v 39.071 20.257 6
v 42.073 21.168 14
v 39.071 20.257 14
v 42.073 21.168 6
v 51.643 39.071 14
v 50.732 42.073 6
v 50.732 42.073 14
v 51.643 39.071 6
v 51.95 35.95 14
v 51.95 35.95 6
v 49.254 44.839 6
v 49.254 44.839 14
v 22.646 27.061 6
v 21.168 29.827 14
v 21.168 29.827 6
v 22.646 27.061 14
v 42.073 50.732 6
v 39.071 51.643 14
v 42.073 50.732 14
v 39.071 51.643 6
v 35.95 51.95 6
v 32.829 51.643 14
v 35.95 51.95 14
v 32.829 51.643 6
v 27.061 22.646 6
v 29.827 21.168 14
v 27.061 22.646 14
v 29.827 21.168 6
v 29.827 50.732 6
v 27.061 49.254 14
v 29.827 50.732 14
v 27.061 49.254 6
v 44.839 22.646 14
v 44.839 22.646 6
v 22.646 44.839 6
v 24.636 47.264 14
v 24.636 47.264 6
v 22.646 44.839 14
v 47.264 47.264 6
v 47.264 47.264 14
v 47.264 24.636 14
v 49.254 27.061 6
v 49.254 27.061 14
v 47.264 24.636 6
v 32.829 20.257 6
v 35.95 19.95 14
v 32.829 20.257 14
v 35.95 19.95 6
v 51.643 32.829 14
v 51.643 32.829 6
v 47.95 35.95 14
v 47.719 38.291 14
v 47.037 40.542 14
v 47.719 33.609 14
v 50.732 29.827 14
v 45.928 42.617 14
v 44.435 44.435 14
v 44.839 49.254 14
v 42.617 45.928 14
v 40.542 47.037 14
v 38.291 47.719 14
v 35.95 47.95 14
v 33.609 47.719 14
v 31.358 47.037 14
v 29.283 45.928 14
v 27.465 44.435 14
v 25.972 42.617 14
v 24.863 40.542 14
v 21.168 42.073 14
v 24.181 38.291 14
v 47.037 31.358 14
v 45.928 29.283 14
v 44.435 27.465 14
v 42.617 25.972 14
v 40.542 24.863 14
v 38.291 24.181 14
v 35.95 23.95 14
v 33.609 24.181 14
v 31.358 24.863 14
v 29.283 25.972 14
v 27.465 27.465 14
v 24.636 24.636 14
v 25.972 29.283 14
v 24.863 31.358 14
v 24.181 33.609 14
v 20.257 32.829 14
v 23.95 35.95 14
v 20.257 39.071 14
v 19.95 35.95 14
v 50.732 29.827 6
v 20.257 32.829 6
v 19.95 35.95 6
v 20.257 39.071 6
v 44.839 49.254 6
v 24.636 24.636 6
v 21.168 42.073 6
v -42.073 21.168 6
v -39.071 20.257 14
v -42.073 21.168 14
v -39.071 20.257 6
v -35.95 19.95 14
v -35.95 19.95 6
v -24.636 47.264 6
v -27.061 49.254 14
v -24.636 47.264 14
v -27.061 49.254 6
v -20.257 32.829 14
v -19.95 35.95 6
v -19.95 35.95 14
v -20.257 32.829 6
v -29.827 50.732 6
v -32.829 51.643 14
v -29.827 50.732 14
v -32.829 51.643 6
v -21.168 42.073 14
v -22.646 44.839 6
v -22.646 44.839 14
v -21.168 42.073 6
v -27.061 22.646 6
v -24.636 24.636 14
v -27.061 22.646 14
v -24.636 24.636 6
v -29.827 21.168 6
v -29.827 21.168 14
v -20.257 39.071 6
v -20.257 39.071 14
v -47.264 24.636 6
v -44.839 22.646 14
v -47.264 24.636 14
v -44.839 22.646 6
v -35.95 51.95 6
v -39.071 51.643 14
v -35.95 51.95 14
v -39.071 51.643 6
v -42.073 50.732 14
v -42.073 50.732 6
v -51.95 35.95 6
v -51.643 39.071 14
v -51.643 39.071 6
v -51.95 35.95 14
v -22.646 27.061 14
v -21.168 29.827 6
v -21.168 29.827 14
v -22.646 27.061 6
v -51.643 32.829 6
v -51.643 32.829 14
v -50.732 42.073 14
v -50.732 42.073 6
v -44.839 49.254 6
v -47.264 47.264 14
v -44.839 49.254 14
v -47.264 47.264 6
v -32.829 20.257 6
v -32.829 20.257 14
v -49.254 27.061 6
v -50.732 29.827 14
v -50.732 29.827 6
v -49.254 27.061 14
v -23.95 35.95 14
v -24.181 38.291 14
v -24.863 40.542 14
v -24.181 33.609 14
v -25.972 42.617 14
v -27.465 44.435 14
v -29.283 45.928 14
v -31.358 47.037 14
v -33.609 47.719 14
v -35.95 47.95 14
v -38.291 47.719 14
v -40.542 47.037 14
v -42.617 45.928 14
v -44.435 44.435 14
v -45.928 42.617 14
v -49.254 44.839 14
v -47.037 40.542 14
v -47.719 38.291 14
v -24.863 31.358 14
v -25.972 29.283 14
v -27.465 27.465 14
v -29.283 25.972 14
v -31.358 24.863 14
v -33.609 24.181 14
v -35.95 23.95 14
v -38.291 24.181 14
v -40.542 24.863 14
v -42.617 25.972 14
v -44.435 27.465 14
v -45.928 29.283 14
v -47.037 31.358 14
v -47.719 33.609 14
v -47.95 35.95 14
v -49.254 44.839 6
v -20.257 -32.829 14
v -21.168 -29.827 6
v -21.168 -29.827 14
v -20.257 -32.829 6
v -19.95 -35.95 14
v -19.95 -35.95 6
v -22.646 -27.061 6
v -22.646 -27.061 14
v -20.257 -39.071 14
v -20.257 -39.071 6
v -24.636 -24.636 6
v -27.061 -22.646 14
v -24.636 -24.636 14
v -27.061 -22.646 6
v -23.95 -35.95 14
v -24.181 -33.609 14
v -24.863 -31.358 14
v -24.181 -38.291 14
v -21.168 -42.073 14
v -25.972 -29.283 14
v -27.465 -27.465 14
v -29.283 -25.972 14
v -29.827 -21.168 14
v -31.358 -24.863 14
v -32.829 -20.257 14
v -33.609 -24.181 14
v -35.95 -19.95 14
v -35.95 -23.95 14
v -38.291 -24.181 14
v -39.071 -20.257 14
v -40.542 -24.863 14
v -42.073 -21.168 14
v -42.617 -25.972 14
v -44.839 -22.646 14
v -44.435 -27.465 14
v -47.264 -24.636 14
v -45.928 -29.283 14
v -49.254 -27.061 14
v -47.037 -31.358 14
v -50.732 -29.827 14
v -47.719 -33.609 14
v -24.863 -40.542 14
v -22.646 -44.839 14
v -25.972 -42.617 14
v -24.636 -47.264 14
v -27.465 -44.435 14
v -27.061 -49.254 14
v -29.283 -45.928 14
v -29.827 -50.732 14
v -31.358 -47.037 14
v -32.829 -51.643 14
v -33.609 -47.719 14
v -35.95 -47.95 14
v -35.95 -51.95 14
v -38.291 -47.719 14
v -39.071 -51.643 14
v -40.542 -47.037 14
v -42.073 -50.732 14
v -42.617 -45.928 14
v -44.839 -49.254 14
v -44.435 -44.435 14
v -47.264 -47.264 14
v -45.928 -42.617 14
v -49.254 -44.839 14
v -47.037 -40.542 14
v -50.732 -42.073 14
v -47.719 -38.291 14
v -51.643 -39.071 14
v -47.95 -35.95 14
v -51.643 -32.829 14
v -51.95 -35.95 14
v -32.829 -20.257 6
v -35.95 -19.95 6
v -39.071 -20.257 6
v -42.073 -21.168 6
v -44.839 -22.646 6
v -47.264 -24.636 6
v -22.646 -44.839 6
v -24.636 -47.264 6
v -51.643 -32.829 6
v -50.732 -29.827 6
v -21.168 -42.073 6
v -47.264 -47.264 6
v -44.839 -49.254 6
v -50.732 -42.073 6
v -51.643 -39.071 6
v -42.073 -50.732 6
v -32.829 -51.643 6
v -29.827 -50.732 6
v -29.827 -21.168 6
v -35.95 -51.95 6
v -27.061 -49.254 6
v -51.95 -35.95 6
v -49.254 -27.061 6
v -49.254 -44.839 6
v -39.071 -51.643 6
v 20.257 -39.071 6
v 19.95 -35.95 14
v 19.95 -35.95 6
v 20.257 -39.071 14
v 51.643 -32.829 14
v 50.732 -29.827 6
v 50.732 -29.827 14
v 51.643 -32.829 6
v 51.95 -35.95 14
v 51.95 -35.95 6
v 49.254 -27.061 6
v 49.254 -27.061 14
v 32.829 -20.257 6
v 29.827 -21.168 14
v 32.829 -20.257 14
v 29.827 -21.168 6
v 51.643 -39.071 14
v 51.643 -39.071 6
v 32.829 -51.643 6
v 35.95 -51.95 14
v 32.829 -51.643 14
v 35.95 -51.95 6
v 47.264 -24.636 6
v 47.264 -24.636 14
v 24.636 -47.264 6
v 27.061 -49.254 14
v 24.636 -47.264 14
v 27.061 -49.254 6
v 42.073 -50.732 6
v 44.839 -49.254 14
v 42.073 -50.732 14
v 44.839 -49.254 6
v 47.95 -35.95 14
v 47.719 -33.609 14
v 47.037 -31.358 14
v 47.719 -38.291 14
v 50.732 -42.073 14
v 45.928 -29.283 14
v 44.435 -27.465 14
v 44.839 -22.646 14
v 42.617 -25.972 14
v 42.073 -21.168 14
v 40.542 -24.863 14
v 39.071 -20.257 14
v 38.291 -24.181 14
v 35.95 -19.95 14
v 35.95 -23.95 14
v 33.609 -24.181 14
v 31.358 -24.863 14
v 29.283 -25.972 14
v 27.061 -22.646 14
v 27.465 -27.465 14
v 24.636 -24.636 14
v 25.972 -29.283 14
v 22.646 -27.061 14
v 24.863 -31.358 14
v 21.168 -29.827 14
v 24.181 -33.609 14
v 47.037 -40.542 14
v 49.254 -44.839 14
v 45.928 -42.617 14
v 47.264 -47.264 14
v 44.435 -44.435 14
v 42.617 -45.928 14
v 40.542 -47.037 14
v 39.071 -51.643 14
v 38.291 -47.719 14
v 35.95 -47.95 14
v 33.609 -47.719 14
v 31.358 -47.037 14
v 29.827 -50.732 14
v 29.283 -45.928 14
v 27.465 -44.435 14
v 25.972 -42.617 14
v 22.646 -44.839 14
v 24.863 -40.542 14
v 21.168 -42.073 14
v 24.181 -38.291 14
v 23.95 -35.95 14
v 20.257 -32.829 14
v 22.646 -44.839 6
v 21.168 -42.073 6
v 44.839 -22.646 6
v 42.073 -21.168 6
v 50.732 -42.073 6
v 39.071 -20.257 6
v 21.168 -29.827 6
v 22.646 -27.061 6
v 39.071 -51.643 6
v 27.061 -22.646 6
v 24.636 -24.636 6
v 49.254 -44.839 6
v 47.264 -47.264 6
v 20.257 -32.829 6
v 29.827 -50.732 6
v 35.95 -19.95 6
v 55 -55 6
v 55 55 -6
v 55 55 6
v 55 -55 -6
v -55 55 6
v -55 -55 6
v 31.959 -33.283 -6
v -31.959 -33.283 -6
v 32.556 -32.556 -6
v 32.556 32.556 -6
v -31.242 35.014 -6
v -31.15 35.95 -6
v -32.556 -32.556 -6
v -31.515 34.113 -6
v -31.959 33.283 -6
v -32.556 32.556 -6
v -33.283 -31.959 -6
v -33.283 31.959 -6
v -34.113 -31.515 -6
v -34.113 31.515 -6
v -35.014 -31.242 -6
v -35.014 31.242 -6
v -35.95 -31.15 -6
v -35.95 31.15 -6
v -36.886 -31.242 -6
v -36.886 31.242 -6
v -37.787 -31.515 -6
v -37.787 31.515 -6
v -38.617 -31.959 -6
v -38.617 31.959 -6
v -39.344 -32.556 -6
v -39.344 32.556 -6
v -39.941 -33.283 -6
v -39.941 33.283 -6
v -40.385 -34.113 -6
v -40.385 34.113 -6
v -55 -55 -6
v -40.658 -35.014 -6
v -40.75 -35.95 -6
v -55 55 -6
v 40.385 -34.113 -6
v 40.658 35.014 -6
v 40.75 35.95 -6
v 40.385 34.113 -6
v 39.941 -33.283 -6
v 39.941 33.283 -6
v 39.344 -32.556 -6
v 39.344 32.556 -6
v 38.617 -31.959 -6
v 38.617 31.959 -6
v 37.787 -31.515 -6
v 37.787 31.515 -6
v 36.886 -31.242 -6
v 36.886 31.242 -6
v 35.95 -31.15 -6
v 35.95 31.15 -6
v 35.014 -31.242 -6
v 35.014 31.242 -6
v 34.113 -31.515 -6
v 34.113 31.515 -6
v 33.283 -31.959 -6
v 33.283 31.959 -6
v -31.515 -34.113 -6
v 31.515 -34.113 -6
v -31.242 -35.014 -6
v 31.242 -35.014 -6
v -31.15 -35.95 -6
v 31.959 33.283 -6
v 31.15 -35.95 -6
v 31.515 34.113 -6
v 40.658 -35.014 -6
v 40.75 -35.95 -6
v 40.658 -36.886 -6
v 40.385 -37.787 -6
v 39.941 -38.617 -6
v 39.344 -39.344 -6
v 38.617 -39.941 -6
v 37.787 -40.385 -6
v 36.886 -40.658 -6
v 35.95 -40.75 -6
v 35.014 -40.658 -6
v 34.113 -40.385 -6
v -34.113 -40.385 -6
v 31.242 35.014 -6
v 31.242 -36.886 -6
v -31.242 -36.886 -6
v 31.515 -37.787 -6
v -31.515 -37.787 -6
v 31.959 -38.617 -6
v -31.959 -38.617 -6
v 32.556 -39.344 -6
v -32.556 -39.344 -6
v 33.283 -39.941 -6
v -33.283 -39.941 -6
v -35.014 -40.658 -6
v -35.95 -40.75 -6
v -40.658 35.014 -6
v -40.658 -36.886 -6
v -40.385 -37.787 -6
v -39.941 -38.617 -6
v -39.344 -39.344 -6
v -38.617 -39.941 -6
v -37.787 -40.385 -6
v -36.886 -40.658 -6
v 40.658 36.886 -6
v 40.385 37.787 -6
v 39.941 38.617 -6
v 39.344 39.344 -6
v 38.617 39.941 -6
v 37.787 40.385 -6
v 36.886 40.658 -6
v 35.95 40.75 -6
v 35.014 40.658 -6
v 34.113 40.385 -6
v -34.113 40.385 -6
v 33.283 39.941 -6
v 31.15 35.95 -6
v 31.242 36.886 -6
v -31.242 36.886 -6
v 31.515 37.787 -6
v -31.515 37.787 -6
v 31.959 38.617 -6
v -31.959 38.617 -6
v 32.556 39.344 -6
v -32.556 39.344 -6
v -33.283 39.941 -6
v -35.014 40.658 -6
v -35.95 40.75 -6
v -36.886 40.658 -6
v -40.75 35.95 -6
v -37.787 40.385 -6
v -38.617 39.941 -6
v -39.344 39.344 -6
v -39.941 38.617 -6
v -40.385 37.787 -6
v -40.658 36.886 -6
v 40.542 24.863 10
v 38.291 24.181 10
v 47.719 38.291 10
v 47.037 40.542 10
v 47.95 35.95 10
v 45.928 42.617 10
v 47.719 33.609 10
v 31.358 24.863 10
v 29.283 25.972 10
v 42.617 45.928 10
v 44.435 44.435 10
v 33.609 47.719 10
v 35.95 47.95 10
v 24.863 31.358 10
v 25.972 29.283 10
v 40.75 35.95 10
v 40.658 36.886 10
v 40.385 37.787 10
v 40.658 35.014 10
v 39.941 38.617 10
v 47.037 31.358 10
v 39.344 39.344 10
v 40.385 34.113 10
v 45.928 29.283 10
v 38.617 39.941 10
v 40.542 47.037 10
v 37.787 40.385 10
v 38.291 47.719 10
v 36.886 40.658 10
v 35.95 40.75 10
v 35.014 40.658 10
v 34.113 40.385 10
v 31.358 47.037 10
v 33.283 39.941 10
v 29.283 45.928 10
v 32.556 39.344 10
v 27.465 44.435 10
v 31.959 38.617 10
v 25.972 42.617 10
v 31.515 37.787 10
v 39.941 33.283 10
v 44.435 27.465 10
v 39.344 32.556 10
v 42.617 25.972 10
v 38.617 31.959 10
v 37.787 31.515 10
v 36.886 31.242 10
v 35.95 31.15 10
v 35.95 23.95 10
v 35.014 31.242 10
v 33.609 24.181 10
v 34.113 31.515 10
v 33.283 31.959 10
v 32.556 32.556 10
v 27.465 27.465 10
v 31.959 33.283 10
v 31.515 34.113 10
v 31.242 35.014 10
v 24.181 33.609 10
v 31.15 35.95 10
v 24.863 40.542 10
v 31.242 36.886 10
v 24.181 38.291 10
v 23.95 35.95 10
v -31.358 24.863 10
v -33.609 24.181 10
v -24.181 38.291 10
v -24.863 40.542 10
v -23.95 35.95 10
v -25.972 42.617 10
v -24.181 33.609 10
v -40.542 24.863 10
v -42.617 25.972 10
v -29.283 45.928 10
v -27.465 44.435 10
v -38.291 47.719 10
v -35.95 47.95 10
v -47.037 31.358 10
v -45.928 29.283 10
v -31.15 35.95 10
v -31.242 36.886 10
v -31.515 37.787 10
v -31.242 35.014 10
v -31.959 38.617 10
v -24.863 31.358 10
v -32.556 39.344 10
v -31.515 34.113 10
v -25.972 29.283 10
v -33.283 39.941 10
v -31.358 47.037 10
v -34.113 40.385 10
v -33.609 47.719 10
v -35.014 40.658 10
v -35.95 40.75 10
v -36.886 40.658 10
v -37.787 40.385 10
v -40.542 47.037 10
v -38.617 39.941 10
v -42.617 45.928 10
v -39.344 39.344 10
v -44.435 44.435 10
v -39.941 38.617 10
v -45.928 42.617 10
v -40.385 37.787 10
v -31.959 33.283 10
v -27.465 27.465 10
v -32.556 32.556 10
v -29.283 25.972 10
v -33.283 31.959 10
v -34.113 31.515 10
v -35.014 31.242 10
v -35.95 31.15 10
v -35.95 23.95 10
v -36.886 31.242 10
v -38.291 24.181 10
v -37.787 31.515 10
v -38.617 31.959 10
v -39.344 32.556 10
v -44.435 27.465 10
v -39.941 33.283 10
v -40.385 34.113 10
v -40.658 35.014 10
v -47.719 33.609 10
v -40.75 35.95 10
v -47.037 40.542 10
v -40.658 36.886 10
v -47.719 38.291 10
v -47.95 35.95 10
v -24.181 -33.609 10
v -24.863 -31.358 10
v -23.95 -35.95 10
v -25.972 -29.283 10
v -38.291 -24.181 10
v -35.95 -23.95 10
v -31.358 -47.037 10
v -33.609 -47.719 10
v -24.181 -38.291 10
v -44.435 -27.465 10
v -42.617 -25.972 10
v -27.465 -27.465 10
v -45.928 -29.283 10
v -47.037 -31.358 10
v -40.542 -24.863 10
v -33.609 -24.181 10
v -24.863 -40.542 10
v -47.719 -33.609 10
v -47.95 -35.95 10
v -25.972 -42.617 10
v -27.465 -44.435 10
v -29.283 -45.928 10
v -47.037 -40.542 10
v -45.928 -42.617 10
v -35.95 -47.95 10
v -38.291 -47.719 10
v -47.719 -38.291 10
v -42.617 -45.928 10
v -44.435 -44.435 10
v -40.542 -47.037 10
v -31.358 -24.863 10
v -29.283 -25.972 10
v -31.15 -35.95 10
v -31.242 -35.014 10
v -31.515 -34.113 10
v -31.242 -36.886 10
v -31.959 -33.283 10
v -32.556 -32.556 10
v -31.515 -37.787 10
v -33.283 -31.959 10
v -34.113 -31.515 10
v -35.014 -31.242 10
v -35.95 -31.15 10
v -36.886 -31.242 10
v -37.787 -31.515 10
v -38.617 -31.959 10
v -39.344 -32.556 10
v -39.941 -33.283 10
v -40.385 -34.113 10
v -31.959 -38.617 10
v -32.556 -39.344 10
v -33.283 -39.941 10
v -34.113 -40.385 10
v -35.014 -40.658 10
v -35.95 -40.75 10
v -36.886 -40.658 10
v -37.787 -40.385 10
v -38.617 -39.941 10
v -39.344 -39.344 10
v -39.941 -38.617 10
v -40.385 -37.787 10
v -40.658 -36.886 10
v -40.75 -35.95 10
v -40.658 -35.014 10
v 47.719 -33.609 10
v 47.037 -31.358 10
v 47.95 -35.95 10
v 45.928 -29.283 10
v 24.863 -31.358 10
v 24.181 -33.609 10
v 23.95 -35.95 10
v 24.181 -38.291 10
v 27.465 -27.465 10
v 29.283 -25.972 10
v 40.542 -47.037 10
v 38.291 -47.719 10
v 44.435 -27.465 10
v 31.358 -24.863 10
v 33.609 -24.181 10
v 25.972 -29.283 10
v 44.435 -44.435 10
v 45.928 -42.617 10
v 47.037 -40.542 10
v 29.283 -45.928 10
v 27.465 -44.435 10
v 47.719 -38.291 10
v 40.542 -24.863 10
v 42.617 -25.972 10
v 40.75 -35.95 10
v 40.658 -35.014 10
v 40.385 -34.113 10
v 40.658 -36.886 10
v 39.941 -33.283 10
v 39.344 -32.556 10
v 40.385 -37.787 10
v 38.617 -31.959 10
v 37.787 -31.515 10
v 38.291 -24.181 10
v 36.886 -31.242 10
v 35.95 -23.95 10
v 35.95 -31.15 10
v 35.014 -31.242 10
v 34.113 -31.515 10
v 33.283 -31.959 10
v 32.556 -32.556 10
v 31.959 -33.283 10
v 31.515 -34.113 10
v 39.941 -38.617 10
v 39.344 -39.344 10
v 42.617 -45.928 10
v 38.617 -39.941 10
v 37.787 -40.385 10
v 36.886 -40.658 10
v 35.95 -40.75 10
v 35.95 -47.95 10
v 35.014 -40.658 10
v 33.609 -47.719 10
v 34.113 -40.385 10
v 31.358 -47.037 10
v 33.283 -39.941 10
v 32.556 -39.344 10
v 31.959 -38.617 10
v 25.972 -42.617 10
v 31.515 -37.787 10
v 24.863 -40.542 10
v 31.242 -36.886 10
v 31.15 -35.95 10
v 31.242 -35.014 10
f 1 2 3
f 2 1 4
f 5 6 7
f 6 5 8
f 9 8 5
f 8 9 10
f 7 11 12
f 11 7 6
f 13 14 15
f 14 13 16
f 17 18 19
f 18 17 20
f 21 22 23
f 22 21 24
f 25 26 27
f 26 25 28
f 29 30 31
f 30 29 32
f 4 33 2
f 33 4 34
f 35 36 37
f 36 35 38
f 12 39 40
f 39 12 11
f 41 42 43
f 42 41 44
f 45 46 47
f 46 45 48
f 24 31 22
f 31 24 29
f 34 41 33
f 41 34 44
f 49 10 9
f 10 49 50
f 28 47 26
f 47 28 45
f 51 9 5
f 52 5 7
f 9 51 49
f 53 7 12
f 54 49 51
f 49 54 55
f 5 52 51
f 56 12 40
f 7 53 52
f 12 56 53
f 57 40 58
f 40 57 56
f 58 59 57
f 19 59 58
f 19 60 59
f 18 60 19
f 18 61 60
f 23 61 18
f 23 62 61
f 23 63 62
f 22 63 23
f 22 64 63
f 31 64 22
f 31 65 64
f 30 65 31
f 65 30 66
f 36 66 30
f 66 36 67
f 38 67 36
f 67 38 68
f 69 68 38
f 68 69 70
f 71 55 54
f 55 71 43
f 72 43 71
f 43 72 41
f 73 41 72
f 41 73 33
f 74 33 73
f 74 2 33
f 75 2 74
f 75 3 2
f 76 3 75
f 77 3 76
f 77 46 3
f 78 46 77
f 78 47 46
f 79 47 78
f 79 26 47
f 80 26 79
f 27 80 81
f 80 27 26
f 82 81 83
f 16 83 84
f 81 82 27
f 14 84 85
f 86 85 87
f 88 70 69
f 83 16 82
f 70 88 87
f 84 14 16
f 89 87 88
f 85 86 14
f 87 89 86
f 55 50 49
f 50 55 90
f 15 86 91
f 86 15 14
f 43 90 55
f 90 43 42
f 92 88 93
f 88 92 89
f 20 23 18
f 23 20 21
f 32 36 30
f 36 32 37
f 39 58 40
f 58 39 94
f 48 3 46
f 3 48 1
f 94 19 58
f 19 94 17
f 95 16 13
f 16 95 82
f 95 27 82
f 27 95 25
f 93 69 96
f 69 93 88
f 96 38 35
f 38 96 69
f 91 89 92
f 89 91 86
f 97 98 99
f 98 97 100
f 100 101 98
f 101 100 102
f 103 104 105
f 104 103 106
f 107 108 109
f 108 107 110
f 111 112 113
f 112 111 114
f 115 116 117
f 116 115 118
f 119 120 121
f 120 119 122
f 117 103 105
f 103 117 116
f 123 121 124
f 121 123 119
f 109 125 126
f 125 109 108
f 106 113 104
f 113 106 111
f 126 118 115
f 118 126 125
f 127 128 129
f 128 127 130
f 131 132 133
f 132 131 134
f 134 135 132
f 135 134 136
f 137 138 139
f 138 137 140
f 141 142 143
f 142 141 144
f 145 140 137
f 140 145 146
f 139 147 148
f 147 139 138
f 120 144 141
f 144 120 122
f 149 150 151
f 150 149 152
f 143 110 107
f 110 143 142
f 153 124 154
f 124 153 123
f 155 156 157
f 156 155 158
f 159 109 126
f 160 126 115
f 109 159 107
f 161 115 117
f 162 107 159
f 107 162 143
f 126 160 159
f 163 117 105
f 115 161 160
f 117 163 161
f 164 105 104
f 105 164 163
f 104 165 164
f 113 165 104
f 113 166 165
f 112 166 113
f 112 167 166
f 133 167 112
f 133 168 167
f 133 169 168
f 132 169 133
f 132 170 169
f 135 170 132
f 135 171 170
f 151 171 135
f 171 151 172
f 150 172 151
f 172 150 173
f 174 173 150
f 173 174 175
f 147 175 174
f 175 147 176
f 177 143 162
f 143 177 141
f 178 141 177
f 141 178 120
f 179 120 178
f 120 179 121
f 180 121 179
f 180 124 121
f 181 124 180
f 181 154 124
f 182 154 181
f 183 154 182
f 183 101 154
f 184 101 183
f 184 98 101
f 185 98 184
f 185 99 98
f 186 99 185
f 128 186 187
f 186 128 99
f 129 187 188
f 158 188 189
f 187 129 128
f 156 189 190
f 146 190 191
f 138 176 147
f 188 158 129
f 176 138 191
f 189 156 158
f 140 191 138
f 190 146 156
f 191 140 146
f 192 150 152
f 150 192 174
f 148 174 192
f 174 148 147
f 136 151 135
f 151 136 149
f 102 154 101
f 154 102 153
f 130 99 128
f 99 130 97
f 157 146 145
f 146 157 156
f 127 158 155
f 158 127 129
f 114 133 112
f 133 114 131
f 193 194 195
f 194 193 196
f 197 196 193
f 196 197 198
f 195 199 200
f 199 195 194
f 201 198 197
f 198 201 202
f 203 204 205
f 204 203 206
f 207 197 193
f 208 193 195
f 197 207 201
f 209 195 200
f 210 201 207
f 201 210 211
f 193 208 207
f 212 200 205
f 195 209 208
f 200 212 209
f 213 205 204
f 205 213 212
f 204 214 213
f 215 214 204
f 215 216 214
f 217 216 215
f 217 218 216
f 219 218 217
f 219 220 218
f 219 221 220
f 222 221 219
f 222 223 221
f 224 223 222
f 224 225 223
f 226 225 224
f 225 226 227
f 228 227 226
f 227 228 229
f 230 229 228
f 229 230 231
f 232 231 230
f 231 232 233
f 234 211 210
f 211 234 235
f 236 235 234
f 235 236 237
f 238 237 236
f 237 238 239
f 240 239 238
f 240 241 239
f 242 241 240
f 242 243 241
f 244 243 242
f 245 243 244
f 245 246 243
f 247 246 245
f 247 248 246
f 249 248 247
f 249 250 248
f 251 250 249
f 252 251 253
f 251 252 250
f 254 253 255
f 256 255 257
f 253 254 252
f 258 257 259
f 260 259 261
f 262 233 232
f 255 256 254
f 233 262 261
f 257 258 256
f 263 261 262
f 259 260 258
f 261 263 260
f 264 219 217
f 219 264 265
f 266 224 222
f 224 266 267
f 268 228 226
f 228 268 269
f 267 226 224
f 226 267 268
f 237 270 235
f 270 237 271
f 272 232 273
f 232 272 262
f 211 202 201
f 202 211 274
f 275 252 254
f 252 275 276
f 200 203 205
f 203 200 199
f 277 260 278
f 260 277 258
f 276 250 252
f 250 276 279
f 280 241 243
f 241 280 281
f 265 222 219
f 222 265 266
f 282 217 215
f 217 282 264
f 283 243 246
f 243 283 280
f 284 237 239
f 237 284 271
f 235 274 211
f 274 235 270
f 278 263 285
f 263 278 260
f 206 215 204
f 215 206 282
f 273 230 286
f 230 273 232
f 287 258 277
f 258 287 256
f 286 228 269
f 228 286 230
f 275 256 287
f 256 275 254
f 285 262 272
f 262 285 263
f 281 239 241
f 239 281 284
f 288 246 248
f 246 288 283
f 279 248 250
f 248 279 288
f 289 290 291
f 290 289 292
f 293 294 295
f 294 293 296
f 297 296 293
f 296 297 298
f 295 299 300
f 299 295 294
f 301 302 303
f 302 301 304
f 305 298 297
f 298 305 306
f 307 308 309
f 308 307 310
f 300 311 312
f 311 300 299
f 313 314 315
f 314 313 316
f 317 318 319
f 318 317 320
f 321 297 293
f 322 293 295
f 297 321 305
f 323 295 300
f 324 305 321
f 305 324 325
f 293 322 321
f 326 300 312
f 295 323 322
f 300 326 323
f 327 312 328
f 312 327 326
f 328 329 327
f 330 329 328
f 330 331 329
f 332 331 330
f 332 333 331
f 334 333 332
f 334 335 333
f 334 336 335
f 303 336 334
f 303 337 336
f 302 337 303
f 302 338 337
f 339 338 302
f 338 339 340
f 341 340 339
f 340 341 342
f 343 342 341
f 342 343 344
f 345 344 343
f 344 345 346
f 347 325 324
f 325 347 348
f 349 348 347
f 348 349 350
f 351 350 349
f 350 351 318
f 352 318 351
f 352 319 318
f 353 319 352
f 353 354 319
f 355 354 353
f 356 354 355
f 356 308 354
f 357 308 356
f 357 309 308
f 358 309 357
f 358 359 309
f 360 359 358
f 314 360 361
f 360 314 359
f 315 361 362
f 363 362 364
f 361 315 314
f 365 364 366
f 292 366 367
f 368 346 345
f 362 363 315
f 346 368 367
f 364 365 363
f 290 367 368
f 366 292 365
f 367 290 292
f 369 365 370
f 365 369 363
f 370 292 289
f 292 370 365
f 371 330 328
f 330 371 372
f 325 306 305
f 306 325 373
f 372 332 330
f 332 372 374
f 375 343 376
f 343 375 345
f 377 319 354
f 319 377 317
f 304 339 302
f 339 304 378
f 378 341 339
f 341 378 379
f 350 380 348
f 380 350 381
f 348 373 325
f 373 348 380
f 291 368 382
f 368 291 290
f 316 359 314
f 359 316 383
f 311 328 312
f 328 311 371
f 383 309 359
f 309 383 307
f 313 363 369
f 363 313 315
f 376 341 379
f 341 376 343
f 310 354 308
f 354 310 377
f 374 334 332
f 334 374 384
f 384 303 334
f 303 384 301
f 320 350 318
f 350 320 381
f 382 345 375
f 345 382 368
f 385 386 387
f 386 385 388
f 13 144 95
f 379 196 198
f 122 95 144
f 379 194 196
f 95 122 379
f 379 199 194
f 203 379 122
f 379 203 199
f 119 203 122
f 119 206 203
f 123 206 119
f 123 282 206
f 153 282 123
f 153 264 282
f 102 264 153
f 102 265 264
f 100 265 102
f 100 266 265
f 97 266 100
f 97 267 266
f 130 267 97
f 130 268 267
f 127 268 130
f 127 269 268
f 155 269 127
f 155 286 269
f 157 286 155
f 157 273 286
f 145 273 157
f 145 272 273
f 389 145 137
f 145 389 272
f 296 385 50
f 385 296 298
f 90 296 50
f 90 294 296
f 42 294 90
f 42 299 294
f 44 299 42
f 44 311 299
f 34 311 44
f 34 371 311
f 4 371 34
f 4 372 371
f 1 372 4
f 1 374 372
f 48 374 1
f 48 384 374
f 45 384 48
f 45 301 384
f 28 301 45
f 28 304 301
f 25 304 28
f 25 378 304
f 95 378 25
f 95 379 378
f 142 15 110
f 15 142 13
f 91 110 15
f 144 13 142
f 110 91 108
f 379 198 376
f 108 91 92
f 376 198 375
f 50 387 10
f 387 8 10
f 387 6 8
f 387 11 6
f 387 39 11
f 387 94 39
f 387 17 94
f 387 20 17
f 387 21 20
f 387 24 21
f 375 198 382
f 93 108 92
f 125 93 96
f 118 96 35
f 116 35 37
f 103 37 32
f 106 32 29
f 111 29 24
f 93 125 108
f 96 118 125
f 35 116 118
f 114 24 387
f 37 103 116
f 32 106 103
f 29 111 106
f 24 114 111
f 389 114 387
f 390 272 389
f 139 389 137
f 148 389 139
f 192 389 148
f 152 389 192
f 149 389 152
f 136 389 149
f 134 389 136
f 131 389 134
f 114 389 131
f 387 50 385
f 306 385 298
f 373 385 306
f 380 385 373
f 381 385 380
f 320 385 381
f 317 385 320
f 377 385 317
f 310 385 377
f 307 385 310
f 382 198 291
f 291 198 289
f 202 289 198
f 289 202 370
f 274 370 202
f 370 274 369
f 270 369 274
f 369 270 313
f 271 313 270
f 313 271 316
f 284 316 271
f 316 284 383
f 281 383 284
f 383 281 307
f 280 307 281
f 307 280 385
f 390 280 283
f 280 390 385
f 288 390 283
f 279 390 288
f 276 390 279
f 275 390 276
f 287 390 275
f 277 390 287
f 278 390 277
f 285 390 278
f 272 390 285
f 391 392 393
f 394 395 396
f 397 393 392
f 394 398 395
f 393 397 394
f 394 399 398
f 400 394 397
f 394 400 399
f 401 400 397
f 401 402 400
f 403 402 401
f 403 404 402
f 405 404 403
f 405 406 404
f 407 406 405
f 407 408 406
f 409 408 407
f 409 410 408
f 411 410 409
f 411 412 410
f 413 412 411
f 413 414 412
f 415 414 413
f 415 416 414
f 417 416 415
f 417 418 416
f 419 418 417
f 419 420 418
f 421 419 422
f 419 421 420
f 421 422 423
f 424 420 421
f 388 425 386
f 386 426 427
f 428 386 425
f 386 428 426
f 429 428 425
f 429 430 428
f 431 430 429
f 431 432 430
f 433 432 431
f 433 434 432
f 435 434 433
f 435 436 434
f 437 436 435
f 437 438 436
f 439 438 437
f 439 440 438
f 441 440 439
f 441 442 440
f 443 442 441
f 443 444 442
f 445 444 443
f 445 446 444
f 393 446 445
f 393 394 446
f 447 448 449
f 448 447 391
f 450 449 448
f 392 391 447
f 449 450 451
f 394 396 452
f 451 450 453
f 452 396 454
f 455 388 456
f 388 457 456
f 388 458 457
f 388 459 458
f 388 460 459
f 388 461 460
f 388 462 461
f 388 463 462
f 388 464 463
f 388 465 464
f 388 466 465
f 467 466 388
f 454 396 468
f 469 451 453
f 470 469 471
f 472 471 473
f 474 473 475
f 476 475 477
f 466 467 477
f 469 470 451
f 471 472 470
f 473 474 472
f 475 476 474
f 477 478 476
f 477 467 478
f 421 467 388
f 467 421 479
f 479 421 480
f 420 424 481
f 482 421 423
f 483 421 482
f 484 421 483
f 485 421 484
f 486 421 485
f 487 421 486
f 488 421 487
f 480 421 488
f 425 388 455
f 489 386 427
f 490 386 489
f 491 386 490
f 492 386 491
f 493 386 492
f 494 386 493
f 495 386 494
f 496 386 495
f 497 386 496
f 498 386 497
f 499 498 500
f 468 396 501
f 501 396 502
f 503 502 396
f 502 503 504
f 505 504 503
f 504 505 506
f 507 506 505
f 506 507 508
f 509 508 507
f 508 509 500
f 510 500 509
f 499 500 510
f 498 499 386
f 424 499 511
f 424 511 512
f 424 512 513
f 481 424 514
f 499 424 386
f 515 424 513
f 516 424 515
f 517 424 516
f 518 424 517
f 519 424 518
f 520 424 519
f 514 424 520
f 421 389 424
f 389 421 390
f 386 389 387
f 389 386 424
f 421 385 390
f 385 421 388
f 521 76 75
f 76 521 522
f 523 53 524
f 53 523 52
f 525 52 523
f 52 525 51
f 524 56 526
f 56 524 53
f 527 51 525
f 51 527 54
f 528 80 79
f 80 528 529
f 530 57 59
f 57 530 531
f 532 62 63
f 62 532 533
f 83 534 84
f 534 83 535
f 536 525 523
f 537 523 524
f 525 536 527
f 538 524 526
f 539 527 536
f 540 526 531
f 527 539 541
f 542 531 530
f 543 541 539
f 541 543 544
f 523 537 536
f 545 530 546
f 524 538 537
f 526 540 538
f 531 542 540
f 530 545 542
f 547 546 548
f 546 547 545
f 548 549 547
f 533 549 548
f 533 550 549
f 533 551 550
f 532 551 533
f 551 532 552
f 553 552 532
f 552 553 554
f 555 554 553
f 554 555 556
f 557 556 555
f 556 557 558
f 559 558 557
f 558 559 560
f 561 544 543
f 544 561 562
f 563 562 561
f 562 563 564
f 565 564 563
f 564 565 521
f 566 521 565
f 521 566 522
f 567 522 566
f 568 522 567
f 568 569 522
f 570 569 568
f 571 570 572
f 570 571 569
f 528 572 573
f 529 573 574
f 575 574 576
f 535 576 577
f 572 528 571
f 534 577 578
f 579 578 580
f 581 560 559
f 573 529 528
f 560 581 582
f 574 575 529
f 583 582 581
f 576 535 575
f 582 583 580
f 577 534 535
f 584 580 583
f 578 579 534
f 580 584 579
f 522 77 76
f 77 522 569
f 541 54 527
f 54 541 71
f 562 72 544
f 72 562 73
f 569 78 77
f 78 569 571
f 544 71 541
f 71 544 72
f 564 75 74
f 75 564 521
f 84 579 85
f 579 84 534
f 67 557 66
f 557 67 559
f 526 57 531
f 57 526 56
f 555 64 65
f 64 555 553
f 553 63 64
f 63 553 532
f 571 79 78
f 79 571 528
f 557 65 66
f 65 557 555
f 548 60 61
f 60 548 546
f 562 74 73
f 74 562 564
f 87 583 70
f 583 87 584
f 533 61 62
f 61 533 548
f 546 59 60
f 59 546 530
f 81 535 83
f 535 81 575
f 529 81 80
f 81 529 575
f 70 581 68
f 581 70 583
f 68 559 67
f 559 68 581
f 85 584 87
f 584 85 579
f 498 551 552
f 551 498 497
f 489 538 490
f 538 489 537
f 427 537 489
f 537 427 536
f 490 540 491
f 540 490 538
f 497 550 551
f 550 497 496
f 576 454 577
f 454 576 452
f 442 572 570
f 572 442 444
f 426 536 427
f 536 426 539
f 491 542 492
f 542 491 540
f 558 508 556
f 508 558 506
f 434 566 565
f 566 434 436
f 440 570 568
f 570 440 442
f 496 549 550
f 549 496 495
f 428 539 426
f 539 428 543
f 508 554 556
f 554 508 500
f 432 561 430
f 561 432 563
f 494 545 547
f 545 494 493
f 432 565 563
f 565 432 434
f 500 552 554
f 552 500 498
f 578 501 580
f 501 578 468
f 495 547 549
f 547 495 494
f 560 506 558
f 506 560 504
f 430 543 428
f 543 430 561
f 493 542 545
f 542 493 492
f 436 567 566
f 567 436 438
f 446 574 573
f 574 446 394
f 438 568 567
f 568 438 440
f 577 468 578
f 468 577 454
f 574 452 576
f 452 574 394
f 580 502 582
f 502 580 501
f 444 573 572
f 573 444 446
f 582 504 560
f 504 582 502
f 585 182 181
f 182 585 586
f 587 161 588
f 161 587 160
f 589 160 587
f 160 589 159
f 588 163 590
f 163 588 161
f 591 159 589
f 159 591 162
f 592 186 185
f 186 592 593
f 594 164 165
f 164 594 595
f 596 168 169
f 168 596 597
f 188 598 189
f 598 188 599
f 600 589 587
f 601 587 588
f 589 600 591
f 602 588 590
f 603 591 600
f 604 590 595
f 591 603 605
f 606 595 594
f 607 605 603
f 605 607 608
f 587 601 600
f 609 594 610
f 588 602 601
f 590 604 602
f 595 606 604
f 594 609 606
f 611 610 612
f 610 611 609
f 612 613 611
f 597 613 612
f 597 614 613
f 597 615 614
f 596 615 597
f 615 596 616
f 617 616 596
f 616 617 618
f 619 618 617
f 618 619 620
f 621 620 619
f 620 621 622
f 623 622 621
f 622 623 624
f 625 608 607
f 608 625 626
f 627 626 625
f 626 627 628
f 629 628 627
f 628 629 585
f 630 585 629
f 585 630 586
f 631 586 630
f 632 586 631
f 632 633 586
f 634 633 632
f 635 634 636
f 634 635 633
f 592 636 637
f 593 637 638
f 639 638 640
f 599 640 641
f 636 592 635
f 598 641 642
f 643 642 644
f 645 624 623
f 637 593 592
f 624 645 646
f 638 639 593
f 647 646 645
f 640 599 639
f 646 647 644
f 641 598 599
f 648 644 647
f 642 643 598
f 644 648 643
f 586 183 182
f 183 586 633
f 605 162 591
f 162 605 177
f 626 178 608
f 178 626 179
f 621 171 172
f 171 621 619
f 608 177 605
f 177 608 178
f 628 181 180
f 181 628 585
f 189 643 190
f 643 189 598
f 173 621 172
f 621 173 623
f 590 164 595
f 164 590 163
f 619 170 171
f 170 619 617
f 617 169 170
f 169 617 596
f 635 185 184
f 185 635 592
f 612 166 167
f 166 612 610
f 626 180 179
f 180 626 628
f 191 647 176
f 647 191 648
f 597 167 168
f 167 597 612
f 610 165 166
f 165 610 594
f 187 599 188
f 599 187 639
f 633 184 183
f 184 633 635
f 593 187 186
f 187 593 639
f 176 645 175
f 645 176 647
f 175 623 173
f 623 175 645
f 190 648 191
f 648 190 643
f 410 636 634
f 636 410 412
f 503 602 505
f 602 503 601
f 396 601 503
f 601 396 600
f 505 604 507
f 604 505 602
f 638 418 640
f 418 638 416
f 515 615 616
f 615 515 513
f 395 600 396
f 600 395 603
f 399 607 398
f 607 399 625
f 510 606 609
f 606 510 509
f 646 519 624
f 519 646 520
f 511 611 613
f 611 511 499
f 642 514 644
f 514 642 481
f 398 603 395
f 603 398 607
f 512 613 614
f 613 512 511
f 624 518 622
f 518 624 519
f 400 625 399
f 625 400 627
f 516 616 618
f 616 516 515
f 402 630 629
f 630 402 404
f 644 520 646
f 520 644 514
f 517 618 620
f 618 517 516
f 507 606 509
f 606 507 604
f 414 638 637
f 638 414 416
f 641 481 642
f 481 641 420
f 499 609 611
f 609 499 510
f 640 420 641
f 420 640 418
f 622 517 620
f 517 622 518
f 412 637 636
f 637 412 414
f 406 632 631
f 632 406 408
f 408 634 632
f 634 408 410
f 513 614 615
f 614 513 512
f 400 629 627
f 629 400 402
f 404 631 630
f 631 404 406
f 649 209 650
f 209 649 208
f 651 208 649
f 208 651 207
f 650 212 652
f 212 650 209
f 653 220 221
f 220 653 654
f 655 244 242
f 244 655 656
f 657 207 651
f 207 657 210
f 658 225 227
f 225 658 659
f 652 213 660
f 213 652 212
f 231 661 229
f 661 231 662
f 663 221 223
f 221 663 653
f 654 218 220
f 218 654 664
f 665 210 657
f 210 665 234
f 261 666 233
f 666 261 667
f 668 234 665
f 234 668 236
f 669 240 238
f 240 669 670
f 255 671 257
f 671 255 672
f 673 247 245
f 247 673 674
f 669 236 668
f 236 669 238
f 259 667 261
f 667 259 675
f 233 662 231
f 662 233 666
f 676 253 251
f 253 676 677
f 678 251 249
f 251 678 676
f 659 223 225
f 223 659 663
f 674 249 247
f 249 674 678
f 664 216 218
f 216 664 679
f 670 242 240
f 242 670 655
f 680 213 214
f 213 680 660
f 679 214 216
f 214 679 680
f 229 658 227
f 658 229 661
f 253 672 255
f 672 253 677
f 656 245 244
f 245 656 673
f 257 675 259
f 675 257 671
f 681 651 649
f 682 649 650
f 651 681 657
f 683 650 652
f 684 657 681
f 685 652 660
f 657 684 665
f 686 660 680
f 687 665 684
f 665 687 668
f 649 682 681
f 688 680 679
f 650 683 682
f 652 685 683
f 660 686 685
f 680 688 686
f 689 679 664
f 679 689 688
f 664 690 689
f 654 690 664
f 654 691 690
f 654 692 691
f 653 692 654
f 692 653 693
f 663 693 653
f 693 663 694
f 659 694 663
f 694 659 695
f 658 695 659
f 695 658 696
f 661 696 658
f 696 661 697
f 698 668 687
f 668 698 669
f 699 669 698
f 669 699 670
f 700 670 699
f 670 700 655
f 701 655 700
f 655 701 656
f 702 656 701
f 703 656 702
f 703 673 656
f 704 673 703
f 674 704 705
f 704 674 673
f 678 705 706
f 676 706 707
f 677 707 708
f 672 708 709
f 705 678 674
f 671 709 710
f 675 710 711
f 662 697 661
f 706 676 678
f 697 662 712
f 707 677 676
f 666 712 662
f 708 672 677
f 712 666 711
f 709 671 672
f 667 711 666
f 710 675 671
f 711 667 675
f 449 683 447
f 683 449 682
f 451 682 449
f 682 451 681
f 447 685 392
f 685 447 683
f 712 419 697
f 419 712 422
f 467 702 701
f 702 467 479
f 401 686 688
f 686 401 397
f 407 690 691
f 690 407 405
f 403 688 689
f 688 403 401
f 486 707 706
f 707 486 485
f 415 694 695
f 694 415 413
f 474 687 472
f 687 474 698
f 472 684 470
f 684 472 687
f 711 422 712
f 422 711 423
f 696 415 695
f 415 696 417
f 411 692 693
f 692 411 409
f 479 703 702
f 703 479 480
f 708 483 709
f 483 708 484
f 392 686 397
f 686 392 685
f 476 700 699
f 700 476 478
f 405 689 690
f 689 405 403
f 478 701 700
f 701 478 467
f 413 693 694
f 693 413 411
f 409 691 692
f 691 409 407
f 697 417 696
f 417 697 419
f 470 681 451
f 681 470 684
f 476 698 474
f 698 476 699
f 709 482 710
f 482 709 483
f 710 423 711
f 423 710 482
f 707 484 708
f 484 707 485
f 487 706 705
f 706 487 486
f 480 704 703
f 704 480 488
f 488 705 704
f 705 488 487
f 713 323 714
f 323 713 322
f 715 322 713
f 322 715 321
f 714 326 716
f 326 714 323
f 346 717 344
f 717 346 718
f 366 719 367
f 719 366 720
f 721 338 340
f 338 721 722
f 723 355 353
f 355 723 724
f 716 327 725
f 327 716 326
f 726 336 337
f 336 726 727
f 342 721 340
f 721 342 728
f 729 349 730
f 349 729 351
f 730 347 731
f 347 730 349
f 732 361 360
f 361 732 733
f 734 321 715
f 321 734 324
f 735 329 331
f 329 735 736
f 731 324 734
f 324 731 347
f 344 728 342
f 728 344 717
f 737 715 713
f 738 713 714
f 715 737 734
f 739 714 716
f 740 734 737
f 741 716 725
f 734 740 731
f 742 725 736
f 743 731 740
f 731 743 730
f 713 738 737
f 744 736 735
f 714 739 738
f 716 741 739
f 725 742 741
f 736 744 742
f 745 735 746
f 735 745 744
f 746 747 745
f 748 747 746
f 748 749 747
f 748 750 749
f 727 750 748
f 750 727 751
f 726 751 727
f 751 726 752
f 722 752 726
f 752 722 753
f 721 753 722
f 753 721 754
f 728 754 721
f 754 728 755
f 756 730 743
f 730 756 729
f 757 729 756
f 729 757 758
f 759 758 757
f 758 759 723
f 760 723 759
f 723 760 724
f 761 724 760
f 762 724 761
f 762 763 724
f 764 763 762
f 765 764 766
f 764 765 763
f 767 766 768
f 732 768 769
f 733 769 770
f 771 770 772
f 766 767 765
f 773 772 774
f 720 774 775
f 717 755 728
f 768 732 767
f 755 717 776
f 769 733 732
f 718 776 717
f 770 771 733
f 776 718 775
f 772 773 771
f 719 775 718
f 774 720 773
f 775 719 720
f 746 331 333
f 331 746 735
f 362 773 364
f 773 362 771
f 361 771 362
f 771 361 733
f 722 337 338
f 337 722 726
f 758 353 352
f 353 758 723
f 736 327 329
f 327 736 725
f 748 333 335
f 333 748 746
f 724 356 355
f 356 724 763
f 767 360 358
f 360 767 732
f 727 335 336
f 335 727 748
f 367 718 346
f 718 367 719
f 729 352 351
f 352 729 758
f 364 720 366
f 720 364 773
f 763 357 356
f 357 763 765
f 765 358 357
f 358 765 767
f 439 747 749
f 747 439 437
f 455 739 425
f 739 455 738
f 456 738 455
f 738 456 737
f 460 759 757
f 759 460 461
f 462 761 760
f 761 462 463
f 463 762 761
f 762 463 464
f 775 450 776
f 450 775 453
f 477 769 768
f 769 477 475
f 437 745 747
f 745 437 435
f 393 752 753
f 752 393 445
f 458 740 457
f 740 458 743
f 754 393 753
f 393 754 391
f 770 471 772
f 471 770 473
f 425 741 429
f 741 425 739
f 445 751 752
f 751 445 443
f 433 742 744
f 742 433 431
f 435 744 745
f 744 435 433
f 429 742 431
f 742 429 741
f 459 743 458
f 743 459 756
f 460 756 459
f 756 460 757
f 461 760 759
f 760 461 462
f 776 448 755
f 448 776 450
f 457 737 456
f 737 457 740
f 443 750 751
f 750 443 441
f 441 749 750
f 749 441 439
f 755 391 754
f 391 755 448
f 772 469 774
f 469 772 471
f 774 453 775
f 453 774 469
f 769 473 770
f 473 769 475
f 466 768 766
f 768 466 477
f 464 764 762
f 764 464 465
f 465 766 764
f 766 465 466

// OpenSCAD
$fn = 32;

// ----------------------------------------------------------------------
// Socket pad plate
// bosses with counterbored sockets for the screws
// ----------------------------------------------------------------------

// --- parameters (mm) ---
base_t = 12;             // base plate thickness
boss_h = 8;              // boss height above the base plate
boss_d = 32;             // boss diameter
socket_d = 24;           // socket diameter
socket_depth = 4;        // socket depth from the boss face
bolt_d = 9.6;            // screw clearance hole through the socket floor
plate = [110, 110, 12];  // overall size (x, y, z)
edge = 19.05;            // boss centre offset from the plate edge
pads = 4;                // boss count, one per corner

// --- derived feature positions (mm) ---
height = base_t + boss_h;        // = 20   overall height of the part
corner_x = plate[0] / 2 - edge;  // = 35.95   boss centre X
corner_y = plate[1] / 2 - edge;  // = 35.95   boss centre Y
feature_centers = [
  [corner_x, corner_y],
  [-corner_x, corner_y],
  [-corner_x, -corner_y],
  [corner_x, -corner_y]
];   // boss centres: sockets, holes and the pads themselves are placed from here

// base plate, bosses on feature_centers, socket + through hole in each
difference() {
  union() {
    cube(plate, center = true);
    for (centre = feature_centers)
      translate([centre[0], centre[1], plate[2] / 2 - 1])
        cylinder(d = boss_d, h = boss_h + 1);
  }
  for (centre = feature_centers) {
    translate([centre[0], centre[1], plate[2] / 2 + boss_h - socket_depth])
      cylinder(d = socket_d, h = socket_depth + 1);
    translate([centre[0], centre[1], -height])
      cylinder(d = bolt_d, h = 2 * height + 2);  // through the socket floor
  }
}
